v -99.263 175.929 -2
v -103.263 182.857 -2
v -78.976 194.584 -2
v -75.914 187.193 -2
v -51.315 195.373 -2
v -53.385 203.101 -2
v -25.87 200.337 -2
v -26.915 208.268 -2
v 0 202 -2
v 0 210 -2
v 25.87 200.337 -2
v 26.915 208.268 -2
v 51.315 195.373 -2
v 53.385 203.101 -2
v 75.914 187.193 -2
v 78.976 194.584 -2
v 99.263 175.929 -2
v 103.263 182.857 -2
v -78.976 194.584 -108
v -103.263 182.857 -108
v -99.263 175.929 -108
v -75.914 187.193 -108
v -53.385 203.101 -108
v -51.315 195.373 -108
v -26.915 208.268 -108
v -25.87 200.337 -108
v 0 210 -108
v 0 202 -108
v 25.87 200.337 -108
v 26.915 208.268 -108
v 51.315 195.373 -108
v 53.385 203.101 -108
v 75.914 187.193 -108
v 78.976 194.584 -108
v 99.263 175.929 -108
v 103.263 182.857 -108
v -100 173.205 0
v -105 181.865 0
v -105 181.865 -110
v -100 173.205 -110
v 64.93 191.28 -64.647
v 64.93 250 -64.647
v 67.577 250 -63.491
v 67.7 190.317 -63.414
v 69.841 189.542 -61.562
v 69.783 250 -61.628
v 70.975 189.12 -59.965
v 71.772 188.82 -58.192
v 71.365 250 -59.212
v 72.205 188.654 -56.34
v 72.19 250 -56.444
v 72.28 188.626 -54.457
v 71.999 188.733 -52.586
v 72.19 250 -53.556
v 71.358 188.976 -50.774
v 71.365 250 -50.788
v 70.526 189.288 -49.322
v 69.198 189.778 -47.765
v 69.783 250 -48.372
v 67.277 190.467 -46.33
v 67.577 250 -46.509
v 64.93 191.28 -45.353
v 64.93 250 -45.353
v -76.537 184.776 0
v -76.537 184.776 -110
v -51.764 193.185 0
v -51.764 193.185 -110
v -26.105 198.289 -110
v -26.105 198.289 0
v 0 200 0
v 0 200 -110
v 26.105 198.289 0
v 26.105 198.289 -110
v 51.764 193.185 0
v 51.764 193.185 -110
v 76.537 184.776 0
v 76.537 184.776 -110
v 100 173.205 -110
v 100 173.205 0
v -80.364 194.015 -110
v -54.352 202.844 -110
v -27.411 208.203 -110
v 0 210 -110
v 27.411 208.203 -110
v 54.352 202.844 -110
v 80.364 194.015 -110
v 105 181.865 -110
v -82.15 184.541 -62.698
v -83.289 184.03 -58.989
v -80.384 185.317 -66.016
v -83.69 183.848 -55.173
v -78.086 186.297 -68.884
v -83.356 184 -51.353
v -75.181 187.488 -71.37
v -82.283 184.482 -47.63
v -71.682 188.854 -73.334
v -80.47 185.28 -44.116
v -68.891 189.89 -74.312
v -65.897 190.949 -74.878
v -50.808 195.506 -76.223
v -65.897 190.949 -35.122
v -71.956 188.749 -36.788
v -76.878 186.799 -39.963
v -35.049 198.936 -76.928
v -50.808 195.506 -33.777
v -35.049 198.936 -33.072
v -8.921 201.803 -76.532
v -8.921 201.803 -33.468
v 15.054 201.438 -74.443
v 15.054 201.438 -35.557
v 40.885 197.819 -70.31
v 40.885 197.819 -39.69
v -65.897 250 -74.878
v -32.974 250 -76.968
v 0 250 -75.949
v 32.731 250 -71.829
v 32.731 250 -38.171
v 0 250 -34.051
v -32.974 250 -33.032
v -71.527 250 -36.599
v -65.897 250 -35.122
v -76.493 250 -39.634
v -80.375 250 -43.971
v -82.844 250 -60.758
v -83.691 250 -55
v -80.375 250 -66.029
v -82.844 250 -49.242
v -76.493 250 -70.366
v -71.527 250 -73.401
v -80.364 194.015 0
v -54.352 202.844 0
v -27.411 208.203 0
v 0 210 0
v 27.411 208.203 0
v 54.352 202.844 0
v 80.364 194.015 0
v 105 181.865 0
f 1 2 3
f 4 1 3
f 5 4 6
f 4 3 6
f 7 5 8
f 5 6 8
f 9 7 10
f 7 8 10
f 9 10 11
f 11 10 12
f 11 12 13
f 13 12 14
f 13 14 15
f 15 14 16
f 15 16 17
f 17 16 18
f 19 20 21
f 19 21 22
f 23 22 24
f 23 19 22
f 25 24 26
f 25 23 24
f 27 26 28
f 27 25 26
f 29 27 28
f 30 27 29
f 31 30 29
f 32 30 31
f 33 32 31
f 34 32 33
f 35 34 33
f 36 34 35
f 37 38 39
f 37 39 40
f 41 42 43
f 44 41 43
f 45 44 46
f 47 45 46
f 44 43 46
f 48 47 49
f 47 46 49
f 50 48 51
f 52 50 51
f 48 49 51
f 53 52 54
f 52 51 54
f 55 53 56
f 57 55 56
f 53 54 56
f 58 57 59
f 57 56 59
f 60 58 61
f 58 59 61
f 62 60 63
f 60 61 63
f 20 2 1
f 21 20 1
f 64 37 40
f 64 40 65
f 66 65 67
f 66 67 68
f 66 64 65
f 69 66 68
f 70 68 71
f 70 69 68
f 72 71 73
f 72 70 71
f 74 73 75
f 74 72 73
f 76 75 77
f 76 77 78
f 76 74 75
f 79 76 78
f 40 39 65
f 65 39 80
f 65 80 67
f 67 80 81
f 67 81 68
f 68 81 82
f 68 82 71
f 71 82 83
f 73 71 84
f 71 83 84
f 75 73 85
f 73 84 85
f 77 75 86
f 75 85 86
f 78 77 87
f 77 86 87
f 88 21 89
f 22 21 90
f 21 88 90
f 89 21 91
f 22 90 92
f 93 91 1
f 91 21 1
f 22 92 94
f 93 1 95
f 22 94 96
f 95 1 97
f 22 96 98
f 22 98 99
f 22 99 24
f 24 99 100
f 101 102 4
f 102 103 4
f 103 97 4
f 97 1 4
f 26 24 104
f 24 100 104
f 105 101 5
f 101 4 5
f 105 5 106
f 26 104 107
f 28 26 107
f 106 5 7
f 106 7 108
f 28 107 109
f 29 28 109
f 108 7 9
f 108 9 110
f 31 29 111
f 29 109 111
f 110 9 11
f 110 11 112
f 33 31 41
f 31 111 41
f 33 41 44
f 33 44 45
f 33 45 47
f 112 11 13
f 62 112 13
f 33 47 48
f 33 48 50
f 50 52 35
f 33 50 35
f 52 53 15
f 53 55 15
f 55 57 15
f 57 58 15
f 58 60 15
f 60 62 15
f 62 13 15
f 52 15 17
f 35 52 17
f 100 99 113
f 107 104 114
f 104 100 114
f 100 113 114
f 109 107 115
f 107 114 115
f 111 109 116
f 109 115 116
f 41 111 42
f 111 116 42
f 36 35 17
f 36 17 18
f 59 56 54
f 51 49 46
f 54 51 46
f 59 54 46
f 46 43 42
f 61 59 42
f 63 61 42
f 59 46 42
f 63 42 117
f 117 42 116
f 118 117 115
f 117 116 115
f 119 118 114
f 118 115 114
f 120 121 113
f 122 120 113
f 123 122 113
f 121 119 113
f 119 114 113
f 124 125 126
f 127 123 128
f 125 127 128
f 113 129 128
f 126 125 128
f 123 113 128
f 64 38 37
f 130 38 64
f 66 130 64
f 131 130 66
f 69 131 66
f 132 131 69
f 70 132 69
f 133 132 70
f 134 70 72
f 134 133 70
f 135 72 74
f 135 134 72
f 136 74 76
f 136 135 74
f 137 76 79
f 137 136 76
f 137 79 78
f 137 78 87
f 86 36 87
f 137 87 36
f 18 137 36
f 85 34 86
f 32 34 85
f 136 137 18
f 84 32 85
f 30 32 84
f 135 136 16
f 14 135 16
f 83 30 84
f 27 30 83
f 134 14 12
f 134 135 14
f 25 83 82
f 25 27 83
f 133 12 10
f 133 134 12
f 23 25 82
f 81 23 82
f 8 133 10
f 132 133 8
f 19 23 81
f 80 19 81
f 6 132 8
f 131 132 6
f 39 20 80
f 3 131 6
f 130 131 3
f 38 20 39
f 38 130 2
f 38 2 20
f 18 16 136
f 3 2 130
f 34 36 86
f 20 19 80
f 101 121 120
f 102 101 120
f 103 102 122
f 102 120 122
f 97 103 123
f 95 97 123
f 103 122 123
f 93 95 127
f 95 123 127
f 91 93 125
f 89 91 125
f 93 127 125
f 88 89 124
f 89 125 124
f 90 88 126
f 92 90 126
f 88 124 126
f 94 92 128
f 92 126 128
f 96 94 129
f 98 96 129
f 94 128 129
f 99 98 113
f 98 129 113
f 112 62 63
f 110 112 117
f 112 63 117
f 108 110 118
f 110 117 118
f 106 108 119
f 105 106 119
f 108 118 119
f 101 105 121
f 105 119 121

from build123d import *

# Parameters (mm, degrees)
BOSS_EXTRUDE1_DEPTH      = 110
SHELL1_T                 = -2
BOSS_EXTRUDE2_REACH      = 172.36
BOSS_EXTRUDE2_END_RADIUS = 202


with BuildPart() as part:
    # Sketch1 → Boss-Extrude1 (new body)
    with BuildSketch(Plane.XY):
        with BuildLine():
            Line((-105, 181.865334795), (-100, 173.205080757))
            ThreePointArc((-100, 173.205080757), (0, 200), (100, 173.205080757))
            Line((100, 173.205080757), (105, 181.865334795))
            ThreePointArc((105, 181.865334795), (0, 210), (-105, 181.865334795))
        make_face()
    extrude(amount=-BOSS_EXTRUDE1_DEPTH)

    # Shell1
    shell1_openings = [part.faces().sort_by_distance(p)[0] for p in [
        (0, 210, -55),
    ]]
    offset(amount=SHELL1_T, openings=shell1_openings, kind=Kind.INTERSECTION)

    # Boss-Extrude2: up to this cylinder (the profile starts outside it)
    boss_extrude2_end = Plane(origin=(0, 0, -55), z_dir=(0, 0, 1)) * Cylinder(BOSS_EXTRUDE2_END_RADIUS, 749.72, mode=Mode.PRIVATE)
    # Sketch2 → Boss-Extrude2 (add, up to the surface)
    with BuildSketch(Plane(origin=(0, 250, 0), x_dir=(1, 0, 0), z_dir=(0, 1, 0)), mode=Mode.PRIVATE) as boss_extrude2_sk1:
        with BuildLine():
            ThreePointArc((-65.897237959, 35.122057745), (-83.691016821, 55), (-65.897237959, 74.877942255))
            ThreePointArc((-65.897237959, 74.877942255), (0, 75.948538311), (64.929649868, 64.646648447))
            ThreePointArc((64.929649868, 64.646648447), (72.294849357, 55), (64.929649868, 45.353351553))
            ThreePointArc((64.929649868, 45.353351553), (0, 34.051461689), (-65.897237959, 35.122057745))
        make_face()
    boss_extrude2_tool1 = extrude(boss_extrude2_sk1.sketch, amount=-BOSS_EXTRUDE2_REACH, mode=Mode.PRIVATE) - boss_extrude2_end
    add(boss_extrude2_tool1.solids().sort_by_distance((-11.41561, 250, -55))[0])


solid = part.part
